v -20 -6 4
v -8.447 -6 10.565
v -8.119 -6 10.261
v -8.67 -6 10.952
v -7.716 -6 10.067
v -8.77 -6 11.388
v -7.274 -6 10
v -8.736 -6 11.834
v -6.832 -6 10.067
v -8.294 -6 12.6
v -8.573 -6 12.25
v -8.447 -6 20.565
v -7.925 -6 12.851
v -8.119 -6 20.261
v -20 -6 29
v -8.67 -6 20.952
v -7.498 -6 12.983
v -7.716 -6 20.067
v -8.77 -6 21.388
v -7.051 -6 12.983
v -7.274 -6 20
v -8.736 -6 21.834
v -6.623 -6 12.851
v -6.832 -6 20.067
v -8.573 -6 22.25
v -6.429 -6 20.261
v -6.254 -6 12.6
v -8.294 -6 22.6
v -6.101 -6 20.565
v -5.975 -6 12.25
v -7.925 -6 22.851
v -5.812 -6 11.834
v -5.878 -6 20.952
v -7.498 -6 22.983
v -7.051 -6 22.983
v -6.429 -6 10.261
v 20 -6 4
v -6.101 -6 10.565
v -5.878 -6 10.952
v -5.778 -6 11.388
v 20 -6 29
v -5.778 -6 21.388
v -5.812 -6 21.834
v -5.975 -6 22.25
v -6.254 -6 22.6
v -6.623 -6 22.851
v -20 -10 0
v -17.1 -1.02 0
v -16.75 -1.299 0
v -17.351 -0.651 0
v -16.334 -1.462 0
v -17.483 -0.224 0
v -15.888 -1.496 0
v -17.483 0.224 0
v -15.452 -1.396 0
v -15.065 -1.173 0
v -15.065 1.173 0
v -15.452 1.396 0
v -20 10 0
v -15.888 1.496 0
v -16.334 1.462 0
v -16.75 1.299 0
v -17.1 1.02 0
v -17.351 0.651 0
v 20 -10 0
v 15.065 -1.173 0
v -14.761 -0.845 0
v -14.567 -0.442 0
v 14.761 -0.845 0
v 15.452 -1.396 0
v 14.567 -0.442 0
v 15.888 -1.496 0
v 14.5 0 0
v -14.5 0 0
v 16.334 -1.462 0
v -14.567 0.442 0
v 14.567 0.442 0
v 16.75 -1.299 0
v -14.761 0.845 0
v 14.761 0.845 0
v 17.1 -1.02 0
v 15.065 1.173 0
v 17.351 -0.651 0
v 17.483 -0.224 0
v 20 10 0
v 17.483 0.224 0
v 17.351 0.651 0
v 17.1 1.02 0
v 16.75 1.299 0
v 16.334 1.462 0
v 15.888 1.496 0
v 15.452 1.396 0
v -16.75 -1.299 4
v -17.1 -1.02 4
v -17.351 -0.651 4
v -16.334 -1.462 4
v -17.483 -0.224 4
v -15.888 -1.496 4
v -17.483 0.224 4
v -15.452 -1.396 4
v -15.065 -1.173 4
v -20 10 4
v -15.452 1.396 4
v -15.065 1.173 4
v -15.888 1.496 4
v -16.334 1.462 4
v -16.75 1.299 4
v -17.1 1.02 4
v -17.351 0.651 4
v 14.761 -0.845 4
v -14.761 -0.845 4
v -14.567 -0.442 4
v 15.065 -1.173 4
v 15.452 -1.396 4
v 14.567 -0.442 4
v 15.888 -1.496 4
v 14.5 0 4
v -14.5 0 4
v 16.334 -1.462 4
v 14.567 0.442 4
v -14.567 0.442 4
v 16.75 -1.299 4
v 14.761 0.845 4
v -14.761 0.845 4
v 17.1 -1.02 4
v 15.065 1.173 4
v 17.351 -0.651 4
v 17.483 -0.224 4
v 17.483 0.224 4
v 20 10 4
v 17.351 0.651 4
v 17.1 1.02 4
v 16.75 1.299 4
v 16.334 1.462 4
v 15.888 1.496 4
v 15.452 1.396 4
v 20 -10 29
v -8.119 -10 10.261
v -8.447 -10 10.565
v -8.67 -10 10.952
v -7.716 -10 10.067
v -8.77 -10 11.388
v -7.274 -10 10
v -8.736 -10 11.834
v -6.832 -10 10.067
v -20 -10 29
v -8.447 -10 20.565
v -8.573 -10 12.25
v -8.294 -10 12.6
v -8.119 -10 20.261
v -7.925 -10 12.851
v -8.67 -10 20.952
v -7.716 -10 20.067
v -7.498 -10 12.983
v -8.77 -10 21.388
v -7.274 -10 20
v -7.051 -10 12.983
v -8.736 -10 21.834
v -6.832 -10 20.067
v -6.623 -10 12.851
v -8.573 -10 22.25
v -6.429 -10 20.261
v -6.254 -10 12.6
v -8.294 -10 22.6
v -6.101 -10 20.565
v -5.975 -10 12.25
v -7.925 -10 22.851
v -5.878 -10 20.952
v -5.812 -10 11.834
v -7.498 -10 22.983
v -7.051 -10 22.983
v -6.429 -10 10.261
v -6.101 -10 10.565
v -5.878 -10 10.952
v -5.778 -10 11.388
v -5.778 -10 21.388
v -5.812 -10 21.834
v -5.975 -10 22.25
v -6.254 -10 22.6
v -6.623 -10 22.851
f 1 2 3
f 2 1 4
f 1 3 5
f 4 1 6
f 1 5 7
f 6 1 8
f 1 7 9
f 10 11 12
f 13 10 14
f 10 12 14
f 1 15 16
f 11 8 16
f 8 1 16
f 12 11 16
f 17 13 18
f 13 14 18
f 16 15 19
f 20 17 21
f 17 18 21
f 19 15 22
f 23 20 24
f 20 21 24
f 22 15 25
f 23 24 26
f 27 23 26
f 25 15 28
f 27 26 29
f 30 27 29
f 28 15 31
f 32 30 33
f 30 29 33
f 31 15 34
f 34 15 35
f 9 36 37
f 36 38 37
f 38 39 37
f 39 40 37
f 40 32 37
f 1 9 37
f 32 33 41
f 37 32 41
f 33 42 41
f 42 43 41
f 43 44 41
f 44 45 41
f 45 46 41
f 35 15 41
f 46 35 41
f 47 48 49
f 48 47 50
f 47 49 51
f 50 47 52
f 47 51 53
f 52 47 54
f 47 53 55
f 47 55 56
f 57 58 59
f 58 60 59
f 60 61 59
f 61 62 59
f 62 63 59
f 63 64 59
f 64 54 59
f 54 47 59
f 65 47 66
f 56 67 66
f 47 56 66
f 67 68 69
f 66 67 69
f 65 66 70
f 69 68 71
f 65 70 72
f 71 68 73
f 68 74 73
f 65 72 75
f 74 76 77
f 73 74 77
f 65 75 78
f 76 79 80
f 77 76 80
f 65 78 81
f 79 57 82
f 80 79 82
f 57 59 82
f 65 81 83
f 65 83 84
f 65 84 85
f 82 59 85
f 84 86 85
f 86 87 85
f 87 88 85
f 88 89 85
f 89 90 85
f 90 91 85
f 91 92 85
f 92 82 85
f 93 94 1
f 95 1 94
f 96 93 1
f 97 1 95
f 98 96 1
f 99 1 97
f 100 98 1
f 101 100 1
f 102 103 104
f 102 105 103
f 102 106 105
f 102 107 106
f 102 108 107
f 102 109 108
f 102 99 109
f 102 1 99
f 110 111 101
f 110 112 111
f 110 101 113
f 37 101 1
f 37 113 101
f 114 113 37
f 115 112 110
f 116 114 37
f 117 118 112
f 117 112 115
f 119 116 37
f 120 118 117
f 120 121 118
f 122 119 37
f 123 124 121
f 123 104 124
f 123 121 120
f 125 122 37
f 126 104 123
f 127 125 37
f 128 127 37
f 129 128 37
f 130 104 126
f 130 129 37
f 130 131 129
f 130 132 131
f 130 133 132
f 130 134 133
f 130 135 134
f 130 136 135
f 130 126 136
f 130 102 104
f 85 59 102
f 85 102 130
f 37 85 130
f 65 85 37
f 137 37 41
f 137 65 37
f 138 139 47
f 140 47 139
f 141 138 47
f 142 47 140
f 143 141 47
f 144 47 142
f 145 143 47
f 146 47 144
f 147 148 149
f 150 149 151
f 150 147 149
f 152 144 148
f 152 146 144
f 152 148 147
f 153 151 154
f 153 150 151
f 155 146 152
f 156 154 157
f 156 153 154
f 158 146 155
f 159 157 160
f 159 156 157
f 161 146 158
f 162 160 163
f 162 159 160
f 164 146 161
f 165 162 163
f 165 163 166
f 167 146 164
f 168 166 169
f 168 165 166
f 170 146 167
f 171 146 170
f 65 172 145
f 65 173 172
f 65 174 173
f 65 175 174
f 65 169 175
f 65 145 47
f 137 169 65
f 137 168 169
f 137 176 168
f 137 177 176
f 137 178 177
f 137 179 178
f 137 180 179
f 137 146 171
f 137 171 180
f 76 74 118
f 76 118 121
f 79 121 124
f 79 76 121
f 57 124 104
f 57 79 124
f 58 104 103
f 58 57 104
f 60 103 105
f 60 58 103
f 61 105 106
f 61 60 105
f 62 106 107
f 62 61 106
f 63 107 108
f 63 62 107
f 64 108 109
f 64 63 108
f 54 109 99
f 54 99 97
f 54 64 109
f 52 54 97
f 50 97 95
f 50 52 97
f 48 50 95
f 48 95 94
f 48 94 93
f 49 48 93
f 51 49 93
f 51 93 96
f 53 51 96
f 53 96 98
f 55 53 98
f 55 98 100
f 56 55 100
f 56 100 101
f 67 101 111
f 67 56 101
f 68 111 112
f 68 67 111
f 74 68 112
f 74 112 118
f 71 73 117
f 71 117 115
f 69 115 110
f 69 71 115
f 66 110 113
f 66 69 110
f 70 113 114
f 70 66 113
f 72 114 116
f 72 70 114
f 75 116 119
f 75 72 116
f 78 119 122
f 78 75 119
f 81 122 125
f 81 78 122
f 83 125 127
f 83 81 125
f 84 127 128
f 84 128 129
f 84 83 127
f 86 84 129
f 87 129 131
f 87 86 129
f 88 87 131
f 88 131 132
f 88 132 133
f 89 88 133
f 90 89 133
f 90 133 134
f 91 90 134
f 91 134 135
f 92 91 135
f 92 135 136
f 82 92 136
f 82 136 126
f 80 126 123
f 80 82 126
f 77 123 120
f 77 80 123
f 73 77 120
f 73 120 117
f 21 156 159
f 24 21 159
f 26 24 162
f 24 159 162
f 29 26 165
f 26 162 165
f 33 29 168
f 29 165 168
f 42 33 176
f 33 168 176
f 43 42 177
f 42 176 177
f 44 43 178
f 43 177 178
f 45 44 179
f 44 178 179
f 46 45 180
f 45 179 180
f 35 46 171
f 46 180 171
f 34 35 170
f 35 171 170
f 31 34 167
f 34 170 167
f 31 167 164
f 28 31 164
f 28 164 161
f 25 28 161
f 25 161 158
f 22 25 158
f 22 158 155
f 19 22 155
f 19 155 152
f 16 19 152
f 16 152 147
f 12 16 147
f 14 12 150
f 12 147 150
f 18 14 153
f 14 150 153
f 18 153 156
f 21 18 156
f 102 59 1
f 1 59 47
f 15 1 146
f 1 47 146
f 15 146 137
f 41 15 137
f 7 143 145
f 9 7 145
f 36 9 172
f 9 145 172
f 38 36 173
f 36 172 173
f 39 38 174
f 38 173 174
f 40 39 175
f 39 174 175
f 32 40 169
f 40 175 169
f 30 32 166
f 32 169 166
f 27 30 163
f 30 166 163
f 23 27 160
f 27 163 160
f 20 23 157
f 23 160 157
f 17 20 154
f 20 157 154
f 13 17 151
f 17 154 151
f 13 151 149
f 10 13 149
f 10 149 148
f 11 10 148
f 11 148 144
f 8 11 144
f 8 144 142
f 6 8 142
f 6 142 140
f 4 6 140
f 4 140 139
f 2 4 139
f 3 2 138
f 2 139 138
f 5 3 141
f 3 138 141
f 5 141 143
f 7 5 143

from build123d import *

# Parameters (mm, degrees)
SKETCH_1_W      = 40
SKETCH_1_H      = 20
SKETCH_1_R      = 1.5
EXTRUDE_1_DEPTH = 4
SKETCH_2_W      = 40
SKETCH_2_H      = 25
SKETCH_2_R      = 1.5
EXTRUDE_2_DEPTH = 4


with BuildPart() as part:
    # Эскиз1 → Бобышка-Вытянуть1 (new body)
    with BuildSketch(Plane.XY):
        Rectangle(SKETCH_1_W, SKETCH_1_H)
        with Locations((-16, 0)):
            Circle(SKETCH_1_R, mode=Mode.SUBTRACT)
        with Locations(Location((16, 0, 0), (0, 0, 180))):
            Circle(SKETCH_1_R, mode=Mode.SUBTRACT)
    extrude(amount=EXTRUDE_1_DEPTH)

    # Эскиз2 → Бобышка-Вытянуть2 (add)
    with BuildSketch(Plane.XZ.offset(10)):
        with Locations((0, 16.5)):
            Rectangle(SKETCH_2_W, SKETCH_2_H)
        with Locations(Location((-7.27406928, 21.5, 0), (0, 0, 270))):
            Circle(SKETCH_2_R, mode=Mode.SUBTRACT)
        with Locations(Location((-7.27406928, 11.5, 0), (0, 0, 270))):
            Circle(SKETCH_2_R, mode=Mode.SUBTRACT)
    extrude(amount=-EXTRUDE_2_DEPTH)


solid = part.part
